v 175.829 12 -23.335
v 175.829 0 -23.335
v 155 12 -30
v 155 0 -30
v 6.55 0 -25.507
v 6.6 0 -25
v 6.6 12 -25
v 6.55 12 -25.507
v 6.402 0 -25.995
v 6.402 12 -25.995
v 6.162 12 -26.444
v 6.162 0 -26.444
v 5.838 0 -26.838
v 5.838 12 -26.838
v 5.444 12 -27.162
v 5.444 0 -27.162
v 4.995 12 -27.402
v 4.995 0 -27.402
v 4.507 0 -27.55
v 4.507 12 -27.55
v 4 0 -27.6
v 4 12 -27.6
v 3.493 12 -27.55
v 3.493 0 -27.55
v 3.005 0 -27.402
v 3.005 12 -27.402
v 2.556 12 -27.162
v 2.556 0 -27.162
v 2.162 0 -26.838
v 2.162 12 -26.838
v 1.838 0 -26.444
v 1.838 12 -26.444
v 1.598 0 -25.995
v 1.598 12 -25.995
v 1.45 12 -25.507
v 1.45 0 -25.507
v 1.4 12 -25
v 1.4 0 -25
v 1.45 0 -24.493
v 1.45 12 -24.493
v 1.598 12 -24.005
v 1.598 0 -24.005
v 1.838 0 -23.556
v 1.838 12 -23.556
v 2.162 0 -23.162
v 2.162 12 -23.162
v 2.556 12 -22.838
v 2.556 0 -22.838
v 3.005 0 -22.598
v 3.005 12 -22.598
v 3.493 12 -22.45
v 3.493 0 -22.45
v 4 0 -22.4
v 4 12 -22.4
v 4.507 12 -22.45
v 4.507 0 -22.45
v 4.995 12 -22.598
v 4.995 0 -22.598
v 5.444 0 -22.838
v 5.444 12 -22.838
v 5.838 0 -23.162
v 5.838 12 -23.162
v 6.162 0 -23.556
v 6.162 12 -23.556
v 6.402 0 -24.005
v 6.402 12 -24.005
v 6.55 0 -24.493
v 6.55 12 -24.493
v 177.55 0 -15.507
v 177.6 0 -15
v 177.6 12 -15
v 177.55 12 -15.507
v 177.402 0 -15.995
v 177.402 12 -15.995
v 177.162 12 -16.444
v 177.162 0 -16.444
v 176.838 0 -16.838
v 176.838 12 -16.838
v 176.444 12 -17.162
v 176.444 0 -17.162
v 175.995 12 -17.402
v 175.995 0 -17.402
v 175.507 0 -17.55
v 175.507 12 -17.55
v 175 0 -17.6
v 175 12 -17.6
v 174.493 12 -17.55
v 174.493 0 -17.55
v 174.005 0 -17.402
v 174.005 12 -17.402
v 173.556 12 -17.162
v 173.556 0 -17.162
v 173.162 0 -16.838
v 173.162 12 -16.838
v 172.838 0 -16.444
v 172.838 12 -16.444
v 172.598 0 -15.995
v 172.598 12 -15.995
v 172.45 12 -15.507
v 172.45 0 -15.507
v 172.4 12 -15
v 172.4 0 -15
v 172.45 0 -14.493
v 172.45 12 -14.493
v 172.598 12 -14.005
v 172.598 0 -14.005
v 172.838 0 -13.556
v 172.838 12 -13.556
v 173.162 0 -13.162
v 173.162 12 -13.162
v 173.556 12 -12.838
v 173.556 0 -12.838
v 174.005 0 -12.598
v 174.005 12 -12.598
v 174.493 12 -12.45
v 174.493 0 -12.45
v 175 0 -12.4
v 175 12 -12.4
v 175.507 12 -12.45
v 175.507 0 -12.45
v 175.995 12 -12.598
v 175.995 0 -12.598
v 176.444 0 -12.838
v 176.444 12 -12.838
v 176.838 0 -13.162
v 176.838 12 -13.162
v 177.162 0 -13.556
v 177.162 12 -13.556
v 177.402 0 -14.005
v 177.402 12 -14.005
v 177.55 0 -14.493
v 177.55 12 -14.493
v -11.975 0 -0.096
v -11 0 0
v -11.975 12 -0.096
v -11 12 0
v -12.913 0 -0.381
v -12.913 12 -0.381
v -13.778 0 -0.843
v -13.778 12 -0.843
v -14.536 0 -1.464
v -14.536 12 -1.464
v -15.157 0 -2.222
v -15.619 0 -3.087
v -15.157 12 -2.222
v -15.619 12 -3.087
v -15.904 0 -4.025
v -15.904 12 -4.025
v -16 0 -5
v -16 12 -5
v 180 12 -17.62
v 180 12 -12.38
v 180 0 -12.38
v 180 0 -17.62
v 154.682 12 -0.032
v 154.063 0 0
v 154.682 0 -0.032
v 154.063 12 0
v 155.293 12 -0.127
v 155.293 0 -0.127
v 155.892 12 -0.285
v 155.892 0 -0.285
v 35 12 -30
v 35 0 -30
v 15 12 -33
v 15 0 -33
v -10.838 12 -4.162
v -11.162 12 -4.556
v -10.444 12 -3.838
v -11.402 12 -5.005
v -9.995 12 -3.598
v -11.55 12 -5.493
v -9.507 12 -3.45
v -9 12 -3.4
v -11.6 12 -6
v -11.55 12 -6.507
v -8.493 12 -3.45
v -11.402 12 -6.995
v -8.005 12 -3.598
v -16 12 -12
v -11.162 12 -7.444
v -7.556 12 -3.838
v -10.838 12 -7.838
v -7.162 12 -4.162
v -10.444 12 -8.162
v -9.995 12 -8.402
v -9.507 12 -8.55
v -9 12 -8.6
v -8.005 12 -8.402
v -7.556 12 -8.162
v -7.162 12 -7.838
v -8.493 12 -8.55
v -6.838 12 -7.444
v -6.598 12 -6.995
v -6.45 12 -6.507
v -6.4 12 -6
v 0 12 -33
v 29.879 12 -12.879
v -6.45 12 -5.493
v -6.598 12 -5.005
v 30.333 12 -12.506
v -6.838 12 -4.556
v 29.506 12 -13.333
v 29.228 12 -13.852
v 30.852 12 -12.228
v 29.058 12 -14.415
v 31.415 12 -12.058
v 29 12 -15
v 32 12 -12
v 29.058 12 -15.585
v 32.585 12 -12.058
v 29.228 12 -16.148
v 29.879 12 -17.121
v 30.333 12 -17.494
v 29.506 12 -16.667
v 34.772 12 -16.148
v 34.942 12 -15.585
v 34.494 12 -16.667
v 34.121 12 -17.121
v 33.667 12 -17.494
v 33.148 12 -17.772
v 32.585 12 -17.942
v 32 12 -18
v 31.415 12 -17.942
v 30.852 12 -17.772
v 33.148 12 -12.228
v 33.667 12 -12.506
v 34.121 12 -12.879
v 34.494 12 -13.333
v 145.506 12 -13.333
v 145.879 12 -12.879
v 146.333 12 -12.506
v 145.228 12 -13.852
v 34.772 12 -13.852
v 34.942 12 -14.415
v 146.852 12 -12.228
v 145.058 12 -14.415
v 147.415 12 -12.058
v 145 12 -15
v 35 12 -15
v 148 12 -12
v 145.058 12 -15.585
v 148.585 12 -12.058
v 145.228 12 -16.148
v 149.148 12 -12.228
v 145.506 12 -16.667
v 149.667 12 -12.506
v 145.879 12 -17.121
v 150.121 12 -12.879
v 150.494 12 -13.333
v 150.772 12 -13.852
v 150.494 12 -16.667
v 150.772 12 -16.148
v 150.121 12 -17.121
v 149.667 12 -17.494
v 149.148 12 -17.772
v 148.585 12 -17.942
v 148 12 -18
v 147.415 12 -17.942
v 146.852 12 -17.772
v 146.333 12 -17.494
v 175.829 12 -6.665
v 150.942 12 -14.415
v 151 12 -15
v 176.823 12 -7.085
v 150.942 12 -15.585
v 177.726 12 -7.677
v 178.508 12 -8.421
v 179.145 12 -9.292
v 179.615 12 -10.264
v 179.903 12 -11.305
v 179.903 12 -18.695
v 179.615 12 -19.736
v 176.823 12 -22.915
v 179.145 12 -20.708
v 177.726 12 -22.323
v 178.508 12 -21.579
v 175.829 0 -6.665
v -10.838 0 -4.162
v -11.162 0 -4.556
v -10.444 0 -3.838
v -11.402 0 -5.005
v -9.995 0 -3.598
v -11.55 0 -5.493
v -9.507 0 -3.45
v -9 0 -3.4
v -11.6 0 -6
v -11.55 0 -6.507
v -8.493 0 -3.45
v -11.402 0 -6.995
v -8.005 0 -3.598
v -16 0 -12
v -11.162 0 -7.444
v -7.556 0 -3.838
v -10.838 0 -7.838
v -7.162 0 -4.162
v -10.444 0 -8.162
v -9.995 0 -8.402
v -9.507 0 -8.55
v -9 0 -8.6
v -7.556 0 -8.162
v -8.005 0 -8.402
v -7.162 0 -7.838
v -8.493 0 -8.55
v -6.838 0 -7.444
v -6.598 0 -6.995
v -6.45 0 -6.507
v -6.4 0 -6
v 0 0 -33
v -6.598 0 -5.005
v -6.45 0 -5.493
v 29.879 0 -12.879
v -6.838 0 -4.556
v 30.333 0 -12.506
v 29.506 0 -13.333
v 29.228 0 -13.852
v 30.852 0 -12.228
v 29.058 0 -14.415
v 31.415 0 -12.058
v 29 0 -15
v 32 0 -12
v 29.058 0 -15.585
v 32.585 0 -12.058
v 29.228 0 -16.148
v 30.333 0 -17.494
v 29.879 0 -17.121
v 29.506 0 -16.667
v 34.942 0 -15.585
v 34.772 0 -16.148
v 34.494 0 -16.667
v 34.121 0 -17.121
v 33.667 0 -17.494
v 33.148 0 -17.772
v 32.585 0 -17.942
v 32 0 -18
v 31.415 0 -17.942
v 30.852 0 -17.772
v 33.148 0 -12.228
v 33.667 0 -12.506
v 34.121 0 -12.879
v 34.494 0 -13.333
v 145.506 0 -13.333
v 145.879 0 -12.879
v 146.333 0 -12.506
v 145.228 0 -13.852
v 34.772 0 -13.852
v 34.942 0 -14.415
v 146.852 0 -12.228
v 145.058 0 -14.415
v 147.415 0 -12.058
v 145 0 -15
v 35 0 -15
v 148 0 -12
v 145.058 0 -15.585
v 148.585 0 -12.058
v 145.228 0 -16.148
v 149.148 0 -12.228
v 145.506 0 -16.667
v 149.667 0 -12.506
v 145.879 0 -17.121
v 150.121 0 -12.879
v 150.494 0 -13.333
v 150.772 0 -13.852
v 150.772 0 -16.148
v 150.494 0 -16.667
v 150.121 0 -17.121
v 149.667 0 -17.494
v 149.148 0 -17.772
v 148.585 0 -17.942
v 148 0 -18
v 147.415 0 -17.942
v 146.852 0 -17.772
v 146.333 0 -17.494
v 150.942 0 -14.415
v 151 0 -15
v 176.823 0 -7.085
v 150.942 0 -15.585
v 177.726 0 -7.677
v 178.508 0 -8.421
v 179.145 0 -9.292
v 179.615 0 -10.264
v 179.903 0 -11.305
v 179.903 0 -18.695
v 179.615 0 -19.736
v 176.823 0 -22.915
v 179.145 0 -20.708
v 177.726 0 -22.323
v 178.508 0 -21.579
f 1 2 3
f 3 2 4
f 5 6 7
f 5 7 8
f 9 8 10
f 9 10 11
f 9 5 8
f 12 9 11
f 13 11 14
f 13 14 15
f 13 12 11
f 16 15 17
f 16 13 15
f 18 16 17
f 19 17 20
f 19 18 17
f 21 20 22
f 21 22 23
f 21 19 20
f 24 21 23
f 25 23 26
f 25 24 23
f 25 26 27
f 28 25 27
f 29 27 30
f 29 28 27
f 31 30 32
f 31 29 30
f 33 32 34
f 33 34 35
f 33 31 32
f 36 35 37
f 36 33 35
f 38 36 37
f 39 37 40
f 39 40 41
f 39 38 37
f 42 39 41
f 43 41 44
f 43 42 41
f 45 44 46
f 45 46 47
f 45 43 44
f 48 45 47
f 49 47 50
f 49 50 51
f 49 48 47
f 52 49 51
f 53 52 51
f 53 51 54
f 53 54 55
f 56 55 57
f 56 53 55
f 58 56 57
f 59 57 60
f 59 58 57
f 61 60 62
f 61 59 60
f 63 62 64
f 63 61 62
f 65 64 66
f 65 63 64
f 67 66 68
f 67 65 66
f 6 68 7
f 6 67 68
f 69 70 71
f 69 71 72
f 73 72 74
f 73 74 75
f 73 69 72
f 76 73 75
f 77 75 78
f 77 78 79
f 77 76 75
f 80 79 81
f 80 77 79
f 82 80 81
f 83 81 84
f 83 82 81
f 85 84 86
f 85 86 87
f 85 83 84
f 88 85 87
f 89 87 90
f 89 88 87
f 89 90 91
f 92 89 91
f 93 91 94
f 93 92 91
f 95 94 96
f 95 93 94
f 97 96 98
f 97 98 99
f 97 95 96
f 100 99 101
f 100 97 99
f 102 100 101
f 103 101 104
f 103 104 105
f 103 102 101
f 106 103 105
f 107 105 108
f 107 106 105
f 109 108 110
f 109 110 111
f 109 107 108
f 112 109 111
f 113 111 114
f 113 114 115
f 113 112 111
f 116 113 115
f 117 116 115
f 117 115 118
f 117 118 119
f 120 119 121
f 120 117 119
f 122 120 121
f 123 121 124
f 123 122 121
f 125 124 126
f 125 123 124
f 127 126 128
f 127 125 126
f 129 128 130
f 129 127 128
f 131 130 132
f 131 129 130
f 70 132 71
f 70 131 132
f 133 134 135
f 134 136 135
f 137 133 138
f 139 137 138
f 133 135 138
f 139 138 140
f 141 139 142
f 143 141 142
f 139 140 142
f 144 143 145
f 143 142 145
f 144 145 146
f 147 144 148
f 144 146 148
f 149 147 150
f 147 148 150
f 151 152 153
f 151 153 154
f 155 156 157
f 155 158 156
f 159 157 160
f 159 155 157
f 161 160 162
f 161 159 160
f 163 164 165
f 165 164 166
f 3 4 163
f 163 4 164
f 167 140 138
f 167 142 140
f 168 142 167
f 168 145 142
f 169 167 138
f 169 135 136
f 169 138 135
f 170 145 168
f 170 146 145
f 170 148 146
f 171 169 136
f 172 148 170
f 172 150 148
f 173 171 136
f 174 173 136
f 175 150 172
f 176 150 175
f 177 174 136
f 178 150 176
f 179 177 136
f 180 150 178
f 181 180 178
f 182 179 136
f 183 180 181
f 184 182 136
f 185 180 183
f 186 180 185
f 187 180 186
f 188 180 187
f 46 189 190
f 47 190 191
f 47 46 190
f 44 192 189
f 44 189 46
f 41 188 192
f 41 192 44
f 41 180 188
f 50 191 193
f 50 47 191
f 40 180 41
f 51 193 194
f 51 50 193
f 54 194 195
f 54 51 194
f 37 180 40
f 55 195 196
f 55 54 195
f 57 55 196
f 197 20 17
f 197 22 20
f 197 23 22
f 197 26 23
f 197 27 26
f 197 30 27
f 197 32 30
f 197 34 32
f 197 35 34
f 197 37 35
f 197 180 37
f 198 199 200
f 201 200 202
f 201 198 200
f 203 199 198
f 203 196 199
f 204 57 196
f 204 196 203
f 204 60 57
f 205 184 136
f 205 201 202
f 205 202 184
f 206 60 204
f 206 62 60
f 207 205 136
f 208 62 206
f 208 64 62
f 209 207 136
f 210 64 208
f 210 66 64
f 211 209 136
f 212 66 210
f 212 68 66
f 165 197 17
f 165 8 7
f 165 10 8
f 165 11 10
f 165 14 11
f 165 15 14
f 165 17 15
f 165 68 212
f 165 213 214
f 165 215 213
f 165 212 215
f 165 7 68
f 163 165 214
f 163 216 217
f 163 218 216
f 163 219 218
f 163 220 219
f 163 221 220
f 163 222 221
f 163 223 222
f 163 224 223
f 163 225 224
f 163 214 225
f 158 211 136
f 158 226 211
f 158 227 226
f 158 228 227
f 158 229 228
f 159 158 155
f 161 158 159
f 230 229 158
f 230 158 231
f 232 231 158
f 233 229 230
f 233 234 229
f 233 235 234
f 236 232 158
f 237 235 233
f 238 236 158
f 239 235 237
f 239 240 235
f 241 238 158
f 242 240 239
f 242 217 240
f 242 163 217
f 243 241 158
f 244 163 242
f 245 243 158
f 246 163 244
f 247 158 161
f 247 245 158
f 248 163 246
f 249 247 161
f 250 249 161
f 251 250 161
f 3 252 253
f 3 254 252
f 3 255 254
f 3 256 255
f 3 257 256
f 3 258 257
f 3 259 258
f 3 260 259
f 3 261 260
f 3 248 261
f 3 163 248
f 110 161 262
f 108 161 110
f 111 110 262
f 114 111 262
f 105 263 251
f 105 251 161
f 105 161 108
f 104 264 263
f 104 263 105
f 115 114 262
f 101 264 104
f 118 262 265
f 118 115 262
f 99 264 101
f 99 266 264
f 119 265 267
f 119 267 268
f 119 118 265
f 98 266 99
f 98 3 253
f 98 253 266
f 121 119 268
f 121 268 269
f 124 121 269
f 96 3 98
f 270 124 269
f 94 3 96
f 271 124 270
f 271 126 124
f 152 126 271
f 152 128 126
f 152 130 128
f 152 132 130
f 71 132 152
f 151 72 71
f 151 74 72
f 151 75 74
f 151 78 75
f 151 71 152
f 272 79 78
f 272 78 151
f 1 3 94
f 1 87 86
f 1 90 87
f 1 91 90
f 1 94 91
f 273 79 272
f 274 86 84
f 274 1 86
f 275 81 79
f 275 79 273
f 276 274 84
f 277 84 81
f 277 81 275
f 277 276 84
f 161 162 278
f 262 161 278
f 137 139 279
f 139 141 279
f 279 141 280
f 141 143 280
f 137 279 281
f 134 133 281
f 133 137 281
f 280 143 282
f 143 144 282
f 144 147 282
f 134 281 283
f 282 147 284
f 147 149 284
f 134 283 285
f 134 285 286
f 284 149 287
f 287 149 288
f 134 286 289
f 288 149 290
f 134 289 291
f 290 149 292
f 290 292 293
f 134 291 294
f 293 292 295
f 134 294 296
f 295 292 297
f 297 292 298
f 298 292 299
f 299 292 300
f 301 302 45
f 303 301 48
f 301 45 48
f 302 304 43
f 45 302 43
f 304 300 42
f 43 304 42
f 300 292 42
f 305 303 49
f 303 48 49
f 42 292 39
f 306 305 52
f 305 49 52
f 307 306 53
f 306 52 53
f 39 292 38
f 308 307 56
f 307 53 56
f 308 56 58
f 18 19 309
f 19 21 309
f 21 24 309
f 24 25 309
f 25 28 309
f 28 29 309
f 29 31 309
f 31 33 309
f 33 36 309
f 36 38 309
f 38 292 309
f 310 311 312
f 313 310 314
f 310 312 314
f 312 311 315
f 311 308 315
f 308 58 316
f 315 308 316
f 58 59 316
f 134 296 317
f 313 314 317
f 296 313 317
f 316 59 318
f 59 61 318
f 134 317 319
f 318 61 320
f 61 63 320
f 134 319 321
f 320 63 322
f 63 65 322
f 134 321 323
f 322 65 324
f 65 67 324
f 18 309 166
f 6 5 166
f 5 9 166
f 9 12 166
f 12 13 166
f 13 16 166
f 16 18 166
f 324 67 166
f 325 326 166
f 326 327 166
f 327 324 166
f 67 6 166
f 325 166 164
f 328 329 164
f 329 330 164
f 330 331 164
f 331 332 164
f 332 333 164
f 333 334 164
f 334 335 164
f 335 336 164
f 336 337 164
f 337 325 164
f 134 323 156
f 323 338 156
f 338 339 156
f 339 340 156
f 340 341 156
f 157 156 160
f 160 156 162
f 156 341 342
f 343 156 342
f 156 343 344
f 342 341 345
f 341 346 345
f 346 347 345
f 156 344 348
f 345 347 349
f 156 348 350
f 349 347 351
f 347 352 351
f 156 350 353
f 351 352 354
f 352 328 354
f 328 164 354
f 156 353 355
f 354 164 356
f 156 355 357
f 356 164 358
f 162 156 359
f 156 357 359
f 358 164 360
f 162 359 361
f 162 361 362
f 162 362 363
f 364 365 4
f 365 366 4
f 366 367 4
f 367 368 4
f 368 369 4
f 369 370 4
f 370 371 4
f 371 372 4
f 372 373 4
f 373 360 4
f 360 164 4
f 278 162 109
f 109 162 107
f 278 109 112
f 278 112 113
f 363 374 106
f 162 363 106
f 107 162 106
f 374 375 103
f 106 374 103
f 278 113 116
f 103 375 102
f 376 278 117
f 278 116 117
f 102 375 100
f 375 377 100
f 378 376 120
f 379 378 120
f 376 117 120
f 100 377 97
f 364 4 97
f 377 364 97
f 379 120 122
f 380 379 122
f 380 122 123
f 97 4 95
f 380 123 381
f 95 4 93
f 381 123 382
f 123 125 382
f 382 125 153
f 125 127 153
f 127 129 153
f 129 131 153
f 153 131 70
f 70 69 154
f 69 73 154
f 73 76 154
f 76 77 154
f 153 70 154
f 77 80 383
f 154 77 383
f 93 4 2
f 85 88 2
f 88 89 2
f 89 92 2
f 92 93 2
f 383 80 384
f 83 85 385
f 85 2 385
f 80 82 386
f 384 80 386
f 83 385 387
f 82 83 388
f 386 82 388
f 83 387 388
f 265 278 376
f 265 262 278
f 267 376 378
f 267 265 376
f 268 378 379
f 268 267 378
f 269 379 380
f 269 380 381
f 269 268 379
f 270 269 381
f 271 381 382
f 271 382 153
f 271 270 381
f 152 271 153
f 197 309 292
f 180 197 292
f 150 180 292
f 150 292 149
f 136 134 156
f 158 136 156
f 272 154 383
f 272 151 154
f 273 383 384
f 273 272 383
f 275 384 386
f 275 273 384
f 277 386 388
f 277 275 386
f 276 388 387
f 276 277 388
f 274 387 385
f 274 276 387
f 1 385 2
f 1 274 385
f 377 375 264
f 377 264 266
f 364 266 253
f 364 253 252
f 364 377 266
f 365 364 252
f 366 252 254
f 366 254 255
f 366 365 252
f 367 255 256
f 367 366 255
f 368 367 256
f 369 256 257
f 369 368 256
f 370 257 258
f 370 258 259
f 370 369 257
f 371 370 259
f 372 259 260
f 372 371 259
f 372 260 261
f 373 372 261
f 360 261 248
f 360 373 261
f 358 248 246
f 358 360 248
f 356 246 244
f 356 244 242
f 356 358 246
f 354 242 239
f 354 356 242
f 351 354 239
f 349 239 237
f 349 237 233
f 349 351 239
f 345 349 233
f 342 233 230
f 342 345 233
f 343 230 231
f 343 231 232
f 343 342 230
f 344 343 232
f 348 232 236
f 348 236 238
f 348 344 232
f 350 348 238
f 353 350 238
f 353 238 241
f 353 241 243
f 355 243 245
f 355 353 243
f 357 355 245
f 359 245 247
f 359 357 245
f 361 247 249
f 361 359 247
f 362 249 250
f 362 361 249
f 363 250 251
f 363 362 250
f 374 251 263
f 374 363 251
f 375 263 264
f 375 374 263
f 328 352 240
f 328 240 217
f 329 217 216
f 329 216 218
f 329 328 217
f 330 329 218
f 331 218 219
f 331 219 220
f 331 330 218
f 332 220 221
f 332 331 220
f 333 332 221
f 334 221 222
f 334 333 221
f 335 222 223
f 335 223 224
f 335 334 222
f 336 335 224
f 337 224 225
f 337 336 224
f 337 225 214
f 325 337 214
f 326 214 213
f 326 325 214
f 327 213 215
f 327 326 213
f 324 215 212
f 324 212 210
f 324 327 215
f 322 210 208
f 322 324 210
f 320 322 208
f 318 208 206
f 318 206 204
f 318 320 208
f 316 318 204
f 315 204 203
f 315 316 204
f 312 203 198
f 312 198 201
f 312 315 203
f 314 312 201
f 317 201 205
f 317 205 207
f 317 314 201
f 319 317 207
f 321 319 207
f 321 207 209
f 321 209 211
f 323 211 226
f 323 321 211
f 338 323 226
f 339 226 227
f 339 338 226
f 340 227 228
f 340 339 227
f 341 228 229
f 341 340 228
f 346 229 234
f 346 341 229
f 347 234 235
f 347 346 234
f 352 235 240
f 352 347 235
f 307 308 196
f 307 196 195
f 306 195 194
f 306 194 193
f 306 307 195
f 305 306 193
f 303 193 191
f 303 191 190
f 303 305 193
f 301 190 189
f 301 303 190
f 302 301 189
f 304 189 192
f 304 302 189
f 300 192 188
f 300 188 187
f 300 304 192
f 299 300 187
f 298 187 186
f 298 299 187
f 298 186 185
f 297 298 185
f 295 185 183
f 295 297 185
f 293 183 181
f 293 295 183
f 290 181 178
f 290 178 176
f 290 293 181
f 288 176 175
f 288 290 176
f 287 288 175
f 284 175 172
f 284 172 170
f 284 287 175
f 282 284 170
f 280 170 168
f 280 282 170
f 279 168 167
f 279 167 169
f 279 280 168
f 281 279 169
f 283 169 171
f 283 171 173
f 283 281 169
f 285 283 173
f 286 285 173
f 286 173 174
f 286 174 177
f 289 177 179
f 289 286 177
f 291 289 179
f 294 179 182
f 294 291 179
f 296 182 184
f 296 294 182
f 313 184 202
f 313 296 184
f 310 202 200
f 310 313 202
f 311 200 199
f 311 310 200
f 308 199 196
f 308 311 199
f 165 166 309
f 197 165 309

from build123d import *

# Parameters (mm, degrees)
SKETCH1_R           = 2.6
SKETCH1_R_2         = 3
BOSS_EXTRUDE1_DEPTH = 12
FILLET1_R           = 5
FILLET2_R           = 6


with BuildPart() as part:
    # Sketch1 → Boss-Extrude1 (new body)
    with BuildSketch(Plane(origin=(0, 0, 0), x_dir=(1, 0, 0), z_dir=(0, 1, 0))):
        Polygon((180, 22), (155, 30), (35, 30), (15, 33), (0, 33), (-16, 12), (-16, 0), (0, 0), (155, 0), (180, 8), align=None)
        with Locations((-9, 6)):
            Circle(SKETCH1_R, mode=Mode.SUBTRACT)
        with Locations((148, 15)):
            Circle(SKETCH1_R_2, mode=Mode.SUBTRACT)
        with Locations((32, 15)):
            Circle(SKETCH1_R_2, mode=Mode.SUBTRACT)
        with Locations((175, 15)):
            Circle(SKETCH1_R, mode=Mode.SUBTRACT)
        with Locations((4, 25)):
            Circle(SKETCH1_R, mode=Mode.SUBTRACT)
    extrude(amount=BOSS_EXTRUDE1_DEPTH)

    # Fillet1
    fillet1_edges = [part.edges().sort_by_distance(p)[0] for p in [
        (-16, 6, 0),
    ]]
    fillet(fillet1_edges, radius=FILLET1_R)

    # Fillet2
    fillet2_edges = [part.edges().sort_by_distance(p)[0] for p in [
        (180, 6, -22),
        (180, 6, -8),
        (155, 6, 0),
    ]]
    fillet(fillet2_edges, radius=FILLET2_R)


solid = part.part
